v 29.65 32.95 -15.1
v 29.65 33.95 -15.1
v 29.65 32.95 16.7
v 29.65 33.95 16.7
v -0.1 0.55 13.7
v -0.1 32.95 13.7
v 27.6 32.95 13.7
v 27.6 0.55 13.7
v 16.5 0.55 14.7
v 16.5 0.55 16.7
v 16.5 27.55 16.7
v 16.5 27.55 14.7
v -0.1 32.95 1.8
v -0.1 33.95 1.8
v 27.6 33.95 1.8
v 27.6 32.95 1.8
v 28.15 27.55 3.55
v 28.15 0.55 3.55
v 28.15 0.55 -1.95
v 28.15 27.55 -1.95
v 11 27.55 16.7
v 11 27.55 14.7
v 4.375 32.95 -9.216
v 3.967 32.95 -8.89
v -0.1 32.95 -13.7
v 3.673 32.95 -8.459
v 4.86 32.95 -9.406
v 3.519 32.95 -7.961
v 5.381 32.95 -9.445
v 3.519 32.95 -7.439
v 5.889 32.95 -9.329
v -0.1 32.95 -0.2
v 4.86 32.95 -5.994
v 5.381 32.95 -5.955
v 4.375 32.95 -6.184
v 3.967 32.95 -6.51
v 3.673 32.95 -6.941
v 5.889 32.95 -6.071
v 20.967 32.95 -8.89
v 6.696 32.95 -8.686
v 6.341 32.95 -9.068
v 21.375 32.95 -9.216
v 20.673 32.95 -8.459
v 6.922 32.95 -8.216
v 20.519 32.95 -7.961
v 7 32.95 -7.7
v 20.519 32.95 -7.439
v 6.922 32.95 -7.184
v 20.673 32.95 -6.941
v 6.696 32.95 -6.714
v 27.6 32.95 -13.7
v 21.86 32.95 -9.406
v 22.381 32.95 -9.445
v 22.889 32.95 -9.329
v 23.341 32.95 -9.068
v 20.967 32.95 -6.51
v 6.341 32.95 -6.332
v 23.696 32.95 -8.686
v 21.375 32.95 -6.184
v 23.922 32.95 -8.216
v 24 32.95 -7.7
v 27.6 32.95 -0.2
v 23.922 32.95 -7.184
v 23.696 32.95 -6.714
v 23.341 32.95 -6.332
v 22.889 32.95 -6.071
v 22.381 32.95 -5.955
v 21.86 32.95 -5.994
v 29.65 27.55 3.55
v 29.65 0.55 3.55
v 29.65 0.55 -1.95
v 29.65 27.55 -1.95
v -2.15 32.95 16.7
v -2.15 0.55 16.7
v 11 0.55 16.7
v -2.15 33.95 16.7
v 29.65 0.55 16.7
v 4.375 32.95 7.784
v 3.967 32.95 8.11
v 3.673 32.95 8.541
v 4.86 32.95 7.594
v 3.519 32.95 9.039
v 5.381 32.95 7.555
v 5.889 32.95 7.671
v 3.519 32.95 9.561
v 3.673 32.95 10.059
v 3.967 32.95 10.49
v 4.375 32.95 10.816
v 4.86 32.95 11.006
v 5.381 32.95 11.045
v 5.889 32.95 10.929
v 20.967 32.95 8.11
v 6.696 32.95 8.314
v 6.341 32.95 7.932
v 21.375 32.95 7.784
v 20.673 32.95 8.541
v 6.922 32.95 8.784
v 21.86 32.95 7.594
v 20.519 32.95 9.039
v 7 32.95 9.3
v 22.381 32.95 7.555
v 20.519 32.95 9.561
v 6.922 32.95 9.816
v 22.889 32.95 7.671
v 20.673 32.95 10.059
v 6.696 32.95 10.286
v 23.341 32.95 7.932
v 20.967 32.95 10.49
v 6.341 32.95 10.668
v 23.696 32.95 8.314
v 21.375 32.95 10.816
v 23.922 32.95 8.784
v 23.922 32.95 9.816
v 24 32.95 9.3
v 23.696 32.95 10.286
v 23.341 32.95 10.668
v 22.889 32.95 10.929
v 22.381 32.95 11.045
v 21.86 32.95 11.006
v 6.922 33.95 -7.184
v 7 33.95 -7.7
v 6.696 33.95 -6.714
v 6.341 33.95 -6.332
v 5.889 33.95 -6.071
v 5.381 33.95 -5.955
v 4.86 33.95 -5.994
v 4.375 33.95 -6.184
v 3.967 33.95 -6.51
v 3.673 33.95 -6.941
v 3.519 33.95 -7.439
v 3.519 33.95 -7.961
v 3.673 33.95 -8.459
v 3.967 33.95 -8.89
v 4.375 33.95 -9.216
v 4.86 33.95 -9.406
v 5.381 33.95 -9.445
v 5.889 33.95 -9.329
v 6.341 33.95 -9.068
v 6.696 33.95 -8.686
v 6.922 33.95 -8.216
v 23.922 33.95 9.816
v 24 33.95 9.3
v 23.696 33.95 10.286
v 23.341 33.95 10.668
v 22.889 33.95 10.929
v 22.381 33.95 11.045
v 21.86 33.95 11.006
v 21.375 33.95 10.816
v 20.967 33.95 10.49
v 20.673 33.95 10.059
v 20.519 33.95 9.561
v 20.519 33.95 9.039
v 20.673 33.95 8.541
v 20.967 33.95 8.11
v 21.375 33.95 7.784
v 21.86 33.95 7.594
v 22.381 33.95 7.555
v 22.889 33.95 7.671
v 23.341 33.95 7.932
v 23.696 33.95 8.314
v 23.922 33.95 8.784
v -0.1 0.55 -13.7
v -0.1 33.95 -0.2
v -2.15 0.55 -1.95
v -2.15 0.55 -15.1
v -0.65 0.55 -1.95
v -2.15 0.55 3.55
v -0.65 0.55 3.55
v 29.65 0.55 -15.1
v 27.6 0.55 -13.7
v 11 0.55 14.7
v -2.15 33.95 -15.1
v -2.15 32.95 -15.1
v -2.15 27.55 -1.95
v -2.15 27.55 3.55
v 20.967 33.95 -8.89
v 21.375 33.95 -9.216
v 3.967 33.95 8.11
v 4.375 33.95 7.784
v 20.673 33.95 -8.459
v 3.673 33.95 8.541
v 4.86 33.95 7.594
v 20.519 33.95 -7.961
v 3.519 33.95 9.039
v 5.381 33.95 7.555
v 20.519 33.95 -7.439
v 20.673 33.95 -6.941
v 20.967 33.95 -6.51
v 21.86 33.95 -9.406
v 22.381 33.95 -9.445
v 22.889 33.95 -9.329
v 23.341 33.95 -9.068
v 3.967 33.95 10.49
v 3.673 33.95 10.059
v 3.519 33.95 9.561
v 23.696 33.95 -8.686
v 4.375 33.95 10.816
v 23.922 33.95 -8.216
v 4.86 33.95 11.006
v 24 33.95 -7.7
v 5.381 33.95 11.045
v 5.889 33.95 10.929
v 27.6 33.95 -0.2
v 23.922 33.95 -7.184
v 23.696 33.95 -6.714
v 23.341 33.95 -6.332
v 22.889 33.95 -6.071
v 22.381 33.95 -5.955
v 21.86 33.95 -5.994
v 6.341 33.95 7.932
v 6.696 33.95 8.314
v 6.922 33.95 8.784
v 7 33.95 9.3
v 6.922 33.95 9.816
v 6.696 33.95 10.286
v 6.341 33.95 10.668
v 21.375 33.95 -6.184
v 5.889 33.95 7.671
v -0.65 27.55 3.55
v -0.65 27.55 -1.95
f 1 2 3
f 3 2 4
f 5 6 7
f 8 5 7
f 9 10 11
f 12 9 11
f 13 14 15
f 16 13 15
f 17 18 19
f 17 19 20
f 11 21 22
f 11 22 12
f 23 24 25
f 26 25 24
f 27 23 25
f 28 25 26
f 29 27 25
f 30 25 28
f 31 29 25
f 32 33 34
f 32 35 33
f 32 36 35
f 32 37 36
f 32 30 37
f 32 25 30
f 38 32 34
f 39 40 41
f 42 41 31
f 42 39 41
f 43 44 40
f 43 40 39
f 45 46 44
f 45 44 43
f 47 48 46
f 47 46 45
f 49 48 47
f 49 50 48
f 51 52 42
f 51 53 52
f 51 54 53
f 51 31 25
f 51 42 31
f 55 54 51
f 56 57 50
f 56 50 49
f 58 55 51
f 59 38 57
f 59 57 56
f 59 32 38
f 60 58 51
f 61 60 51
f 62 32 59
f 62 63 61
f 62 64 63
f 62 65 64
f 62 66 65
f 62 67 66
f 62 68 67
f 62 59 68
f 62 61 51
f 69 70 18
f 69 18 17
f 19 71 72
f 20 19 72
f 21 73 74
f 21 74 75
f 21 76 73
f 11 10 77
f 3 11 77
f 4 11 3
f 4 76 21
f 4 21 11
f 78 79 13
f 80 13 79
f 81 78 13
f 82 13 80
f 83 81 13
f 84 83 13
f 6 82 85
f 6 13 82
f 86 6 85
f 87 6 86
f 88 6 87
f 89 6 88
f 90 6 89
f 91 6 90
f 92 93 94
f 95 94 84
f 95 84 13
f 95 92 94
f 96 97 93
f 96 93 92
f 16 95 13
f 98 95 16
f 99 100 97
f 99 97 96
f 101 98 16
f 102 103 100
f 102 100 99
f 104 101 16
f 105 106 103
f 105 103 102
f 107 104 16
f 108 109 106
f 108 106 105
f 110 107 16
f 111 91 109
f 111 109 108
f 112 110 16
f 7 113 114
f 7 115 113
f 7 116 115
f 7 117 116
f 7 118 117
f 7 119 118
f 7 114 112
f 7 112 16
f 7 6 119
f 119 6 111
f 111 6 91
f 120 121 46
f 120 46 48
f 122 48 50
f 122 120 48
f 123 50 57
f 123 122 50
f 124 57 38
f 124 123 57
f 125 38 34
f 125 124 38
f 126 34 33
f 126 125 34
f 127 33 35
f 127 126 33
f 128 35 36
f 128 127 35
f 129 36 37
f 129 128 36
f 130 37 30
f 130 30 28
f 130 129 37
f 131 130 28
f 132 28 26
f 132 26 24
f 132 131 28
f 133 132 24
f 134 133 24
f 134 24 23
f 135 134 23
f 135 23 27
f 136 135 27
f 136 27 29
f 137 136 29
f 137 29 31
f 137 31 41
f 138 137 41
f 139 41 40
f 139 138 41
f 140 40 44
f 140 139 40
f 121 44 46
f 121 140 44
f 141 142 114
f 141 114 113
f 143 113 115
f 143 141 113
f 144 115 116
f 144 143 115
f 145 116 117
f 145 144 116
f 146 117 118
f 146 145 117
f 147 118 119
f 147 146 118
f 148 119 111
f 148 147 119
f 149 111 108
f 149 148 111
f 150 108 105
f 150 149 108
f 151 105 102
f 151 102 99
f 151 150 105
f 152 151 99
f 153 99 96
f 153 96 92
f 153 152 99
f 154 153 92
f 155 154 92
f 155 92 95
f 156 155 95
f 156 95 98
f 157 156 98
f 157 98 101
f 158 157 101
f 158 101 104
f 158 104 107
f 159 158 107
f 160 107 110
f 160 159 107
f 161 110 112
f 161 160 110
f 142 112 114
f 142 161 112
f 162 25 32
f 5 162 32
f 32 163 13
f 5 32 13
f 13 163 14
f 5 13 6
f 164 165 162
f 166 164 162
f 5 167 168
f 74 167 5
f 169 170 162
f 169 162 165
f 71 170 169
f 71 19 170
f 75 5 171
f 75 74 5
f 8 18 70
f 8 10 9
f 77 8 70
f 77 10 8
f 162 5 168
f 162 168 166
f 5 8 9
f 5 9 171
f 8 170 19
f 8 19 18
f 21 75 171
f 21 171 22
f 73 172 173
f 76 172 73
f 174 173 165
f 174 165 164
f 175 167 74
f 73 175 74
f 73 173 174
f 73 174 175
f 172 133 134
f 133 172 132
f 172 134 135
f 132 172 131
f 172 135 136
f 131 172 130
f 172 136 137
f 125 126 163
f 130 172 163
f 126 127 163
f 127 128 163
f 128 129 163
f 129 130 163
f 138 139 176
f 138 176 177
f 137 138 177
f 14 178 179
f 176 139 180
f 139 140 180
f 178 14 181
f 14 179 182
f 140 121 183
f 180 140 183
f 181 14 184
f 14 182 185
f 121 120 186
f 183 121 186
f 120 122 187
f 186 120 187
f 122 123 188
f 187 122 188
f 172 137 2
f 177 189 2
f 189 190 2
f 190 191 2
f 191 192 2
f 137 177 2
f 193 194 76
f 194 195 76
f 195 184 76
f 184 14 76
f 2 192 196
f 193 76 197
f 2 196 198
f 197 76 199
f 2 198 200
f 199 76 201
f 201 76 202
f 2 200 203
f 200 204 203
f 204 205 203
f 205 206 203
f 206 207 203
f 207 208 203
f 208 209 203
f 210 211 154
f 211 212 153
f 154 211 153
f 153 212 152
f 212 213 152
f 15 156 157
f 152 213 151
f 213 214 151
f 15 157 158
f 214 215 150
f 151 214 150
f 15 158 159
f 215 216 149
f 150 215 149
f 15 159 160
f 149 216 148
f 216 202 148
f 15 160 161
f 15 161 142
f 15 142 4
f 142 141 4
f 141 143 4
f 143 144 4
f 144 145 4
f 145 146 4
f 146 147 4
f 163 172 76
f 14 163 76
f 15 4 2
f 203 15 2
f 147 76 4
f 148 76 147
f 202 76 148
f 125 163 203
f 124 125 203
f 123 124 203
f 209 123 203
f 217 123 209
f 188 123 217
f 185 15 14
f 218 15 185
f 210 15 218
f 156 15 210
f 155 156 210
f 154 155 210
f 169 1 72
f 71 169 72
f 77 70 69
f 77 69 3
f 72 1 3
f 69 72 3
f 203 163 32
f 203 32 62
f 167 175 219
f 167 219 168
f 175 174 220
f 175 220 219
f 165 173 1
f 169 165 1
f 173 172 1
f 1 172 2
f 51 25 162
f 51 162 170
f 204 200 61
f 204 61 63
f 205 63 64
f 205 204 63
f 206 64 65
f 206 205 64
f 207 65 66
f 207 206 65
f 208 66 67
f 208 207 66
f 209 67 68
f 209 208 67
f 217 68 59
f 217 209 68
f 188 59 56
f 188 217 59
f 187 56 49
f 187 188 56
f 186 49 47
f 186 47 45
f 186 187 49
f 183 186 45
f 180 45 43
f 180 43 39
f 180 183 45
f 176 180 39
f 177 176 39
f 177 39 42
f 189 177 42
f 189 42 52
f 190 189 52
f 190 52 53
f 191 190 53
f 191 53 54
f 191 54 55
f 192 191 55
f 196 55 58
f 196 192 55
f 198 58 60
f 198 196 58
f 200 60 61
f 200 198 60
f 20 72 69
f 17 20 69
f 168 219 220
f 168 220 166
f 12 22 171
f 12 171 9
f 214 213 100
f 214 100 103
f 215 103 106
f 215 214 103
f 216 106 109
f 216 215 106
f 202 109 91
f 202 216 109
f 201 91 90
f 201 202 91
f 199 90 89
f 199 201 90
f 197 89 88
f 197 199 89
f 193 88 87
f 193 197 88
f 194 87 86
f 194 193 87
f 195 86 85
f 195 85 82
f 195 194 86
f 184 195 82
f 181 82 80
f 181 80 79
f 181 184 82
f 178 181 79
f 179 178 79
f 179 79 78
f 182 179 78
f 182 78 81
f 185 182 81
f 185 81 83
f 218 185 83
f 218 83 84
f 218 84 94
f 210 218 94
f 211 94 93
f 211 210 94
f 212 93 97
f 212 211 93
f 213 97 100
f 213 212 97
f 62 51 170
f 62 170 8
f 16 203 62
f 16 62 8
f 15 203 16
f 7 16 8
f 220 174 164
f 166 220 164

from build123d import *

# Parameters (mm, degrees)
SKETCH013_W     = 31.8
SKETCH013_H     = 31.8
SKETCH013_R     = 1.75
SKETCH013_W_2   = 27.700439
SKETCH013_H_2   = 2
PAD005_DEPTH    = 1
SKETCH014_W     = 31.8
SKETCH014_H     = 31.8
SKETCH014_W_2   = 27.700439
SKETCH014_H_2   = 27.4
PAD006_DEPTH    = 32.4
SKETCH024_W     = 5.5
SKETCH024_H     = 27
POCKET010_DEPTH = 2
SKETCH025_W     = 27
SKETCH025_H     = 5.5
POCKET011_DEPTH = 1.5
SKETCH026_W     = 27
SKETCH026_H     = 5.5
POCKET012_DEPTH = 1.5


with BuildPart() as part:
    # Sketch013 (on Face2 of Binder003) → Pad005 (new body)
    with BuildSketch(Plane.XZ.offset(-33.95)):
        with Locations((13.749781, 0.8)):
            Rectangle(SKETCH013_W, SKETCH013_H)
        with Locations((5.24978, 9.3)):
            Circle(SKETCH013_R, mode=Mode.SUBTRACT)
        with Locations((22.24978, 9.3)):
            Circle(SKETCH013_R, mode=Mode.SUBTRACT)
        with Locations((22.24978, -7.7)):
            Circle(SKETCH013_R, mode=Mode.SUBTRACT)
        with Locations((5.24978, -7.7)):
            Circle(SKETCH013_R, mode=Mode.SUBTRACT)
        with Locations((13.74978, 0.8)):
            Rectangle(SKETCH013_W_2, SKETCH013_H_2, mode=Mode.SUBTRACT)
    extrude(amount=PAD005_DEPTH)

    # Sketch014 (on Face14 of Pad005) → Pad006 (join)
    with BuildSketch(Plane.XZ.offset(-32.95)):
        with Locations((13.74978, 0.8)):
            Rectangle(SKETCH014_W, SKETCH014_H)
        with Locations((13.74978, 0)):
            Rectangle(SKETCH014_W_2, SKETCH014_H_2, mode=Mode.SUBTRACT)
    extrude(amount=PAD006_DEPTH)

    # Sketch024 (on Face14 of Pad006) → Pocket010 (cut)
    with BuildSketch(Plane.XY.offset(16.7)):
        with Locations((13.74978, 14.05)):
            Rectangle(SKETCH024_W, SKETCH024_H)
    extrude(amount=-POCKET010_DEPTH, mode=Mode.SUBTRACT)

    # Sketch025 (on Face2 of Pocket010) → Pocket011 (cut)
    with BuildSketch(Plane(origin=(-2.15022, 0, 0), x_dir=(0, -1, 0), z_dir=(-1, 0, 0))):
        with Locations((-14.05, 0.8)):
            Rectangle(SKETCH025_W, SKETCH025_H)
    extrude(amount=-POCKET011_DEPTH, mode=Mode.SUBTRACT)

    # Sketch026 (on Face4 of Pocket011) → Pocket012 (cut)
    with BuildSketch(Plane.YZ.offset(29.64978)):
        with Locations((14.05, 0.8)):
            Rectangle(SKETCH026_W, SKETCH026_H)
    extrude(amount=-POCKET012_DEPTH, mode=Mode.SUBTRACT)


solid = part.part
